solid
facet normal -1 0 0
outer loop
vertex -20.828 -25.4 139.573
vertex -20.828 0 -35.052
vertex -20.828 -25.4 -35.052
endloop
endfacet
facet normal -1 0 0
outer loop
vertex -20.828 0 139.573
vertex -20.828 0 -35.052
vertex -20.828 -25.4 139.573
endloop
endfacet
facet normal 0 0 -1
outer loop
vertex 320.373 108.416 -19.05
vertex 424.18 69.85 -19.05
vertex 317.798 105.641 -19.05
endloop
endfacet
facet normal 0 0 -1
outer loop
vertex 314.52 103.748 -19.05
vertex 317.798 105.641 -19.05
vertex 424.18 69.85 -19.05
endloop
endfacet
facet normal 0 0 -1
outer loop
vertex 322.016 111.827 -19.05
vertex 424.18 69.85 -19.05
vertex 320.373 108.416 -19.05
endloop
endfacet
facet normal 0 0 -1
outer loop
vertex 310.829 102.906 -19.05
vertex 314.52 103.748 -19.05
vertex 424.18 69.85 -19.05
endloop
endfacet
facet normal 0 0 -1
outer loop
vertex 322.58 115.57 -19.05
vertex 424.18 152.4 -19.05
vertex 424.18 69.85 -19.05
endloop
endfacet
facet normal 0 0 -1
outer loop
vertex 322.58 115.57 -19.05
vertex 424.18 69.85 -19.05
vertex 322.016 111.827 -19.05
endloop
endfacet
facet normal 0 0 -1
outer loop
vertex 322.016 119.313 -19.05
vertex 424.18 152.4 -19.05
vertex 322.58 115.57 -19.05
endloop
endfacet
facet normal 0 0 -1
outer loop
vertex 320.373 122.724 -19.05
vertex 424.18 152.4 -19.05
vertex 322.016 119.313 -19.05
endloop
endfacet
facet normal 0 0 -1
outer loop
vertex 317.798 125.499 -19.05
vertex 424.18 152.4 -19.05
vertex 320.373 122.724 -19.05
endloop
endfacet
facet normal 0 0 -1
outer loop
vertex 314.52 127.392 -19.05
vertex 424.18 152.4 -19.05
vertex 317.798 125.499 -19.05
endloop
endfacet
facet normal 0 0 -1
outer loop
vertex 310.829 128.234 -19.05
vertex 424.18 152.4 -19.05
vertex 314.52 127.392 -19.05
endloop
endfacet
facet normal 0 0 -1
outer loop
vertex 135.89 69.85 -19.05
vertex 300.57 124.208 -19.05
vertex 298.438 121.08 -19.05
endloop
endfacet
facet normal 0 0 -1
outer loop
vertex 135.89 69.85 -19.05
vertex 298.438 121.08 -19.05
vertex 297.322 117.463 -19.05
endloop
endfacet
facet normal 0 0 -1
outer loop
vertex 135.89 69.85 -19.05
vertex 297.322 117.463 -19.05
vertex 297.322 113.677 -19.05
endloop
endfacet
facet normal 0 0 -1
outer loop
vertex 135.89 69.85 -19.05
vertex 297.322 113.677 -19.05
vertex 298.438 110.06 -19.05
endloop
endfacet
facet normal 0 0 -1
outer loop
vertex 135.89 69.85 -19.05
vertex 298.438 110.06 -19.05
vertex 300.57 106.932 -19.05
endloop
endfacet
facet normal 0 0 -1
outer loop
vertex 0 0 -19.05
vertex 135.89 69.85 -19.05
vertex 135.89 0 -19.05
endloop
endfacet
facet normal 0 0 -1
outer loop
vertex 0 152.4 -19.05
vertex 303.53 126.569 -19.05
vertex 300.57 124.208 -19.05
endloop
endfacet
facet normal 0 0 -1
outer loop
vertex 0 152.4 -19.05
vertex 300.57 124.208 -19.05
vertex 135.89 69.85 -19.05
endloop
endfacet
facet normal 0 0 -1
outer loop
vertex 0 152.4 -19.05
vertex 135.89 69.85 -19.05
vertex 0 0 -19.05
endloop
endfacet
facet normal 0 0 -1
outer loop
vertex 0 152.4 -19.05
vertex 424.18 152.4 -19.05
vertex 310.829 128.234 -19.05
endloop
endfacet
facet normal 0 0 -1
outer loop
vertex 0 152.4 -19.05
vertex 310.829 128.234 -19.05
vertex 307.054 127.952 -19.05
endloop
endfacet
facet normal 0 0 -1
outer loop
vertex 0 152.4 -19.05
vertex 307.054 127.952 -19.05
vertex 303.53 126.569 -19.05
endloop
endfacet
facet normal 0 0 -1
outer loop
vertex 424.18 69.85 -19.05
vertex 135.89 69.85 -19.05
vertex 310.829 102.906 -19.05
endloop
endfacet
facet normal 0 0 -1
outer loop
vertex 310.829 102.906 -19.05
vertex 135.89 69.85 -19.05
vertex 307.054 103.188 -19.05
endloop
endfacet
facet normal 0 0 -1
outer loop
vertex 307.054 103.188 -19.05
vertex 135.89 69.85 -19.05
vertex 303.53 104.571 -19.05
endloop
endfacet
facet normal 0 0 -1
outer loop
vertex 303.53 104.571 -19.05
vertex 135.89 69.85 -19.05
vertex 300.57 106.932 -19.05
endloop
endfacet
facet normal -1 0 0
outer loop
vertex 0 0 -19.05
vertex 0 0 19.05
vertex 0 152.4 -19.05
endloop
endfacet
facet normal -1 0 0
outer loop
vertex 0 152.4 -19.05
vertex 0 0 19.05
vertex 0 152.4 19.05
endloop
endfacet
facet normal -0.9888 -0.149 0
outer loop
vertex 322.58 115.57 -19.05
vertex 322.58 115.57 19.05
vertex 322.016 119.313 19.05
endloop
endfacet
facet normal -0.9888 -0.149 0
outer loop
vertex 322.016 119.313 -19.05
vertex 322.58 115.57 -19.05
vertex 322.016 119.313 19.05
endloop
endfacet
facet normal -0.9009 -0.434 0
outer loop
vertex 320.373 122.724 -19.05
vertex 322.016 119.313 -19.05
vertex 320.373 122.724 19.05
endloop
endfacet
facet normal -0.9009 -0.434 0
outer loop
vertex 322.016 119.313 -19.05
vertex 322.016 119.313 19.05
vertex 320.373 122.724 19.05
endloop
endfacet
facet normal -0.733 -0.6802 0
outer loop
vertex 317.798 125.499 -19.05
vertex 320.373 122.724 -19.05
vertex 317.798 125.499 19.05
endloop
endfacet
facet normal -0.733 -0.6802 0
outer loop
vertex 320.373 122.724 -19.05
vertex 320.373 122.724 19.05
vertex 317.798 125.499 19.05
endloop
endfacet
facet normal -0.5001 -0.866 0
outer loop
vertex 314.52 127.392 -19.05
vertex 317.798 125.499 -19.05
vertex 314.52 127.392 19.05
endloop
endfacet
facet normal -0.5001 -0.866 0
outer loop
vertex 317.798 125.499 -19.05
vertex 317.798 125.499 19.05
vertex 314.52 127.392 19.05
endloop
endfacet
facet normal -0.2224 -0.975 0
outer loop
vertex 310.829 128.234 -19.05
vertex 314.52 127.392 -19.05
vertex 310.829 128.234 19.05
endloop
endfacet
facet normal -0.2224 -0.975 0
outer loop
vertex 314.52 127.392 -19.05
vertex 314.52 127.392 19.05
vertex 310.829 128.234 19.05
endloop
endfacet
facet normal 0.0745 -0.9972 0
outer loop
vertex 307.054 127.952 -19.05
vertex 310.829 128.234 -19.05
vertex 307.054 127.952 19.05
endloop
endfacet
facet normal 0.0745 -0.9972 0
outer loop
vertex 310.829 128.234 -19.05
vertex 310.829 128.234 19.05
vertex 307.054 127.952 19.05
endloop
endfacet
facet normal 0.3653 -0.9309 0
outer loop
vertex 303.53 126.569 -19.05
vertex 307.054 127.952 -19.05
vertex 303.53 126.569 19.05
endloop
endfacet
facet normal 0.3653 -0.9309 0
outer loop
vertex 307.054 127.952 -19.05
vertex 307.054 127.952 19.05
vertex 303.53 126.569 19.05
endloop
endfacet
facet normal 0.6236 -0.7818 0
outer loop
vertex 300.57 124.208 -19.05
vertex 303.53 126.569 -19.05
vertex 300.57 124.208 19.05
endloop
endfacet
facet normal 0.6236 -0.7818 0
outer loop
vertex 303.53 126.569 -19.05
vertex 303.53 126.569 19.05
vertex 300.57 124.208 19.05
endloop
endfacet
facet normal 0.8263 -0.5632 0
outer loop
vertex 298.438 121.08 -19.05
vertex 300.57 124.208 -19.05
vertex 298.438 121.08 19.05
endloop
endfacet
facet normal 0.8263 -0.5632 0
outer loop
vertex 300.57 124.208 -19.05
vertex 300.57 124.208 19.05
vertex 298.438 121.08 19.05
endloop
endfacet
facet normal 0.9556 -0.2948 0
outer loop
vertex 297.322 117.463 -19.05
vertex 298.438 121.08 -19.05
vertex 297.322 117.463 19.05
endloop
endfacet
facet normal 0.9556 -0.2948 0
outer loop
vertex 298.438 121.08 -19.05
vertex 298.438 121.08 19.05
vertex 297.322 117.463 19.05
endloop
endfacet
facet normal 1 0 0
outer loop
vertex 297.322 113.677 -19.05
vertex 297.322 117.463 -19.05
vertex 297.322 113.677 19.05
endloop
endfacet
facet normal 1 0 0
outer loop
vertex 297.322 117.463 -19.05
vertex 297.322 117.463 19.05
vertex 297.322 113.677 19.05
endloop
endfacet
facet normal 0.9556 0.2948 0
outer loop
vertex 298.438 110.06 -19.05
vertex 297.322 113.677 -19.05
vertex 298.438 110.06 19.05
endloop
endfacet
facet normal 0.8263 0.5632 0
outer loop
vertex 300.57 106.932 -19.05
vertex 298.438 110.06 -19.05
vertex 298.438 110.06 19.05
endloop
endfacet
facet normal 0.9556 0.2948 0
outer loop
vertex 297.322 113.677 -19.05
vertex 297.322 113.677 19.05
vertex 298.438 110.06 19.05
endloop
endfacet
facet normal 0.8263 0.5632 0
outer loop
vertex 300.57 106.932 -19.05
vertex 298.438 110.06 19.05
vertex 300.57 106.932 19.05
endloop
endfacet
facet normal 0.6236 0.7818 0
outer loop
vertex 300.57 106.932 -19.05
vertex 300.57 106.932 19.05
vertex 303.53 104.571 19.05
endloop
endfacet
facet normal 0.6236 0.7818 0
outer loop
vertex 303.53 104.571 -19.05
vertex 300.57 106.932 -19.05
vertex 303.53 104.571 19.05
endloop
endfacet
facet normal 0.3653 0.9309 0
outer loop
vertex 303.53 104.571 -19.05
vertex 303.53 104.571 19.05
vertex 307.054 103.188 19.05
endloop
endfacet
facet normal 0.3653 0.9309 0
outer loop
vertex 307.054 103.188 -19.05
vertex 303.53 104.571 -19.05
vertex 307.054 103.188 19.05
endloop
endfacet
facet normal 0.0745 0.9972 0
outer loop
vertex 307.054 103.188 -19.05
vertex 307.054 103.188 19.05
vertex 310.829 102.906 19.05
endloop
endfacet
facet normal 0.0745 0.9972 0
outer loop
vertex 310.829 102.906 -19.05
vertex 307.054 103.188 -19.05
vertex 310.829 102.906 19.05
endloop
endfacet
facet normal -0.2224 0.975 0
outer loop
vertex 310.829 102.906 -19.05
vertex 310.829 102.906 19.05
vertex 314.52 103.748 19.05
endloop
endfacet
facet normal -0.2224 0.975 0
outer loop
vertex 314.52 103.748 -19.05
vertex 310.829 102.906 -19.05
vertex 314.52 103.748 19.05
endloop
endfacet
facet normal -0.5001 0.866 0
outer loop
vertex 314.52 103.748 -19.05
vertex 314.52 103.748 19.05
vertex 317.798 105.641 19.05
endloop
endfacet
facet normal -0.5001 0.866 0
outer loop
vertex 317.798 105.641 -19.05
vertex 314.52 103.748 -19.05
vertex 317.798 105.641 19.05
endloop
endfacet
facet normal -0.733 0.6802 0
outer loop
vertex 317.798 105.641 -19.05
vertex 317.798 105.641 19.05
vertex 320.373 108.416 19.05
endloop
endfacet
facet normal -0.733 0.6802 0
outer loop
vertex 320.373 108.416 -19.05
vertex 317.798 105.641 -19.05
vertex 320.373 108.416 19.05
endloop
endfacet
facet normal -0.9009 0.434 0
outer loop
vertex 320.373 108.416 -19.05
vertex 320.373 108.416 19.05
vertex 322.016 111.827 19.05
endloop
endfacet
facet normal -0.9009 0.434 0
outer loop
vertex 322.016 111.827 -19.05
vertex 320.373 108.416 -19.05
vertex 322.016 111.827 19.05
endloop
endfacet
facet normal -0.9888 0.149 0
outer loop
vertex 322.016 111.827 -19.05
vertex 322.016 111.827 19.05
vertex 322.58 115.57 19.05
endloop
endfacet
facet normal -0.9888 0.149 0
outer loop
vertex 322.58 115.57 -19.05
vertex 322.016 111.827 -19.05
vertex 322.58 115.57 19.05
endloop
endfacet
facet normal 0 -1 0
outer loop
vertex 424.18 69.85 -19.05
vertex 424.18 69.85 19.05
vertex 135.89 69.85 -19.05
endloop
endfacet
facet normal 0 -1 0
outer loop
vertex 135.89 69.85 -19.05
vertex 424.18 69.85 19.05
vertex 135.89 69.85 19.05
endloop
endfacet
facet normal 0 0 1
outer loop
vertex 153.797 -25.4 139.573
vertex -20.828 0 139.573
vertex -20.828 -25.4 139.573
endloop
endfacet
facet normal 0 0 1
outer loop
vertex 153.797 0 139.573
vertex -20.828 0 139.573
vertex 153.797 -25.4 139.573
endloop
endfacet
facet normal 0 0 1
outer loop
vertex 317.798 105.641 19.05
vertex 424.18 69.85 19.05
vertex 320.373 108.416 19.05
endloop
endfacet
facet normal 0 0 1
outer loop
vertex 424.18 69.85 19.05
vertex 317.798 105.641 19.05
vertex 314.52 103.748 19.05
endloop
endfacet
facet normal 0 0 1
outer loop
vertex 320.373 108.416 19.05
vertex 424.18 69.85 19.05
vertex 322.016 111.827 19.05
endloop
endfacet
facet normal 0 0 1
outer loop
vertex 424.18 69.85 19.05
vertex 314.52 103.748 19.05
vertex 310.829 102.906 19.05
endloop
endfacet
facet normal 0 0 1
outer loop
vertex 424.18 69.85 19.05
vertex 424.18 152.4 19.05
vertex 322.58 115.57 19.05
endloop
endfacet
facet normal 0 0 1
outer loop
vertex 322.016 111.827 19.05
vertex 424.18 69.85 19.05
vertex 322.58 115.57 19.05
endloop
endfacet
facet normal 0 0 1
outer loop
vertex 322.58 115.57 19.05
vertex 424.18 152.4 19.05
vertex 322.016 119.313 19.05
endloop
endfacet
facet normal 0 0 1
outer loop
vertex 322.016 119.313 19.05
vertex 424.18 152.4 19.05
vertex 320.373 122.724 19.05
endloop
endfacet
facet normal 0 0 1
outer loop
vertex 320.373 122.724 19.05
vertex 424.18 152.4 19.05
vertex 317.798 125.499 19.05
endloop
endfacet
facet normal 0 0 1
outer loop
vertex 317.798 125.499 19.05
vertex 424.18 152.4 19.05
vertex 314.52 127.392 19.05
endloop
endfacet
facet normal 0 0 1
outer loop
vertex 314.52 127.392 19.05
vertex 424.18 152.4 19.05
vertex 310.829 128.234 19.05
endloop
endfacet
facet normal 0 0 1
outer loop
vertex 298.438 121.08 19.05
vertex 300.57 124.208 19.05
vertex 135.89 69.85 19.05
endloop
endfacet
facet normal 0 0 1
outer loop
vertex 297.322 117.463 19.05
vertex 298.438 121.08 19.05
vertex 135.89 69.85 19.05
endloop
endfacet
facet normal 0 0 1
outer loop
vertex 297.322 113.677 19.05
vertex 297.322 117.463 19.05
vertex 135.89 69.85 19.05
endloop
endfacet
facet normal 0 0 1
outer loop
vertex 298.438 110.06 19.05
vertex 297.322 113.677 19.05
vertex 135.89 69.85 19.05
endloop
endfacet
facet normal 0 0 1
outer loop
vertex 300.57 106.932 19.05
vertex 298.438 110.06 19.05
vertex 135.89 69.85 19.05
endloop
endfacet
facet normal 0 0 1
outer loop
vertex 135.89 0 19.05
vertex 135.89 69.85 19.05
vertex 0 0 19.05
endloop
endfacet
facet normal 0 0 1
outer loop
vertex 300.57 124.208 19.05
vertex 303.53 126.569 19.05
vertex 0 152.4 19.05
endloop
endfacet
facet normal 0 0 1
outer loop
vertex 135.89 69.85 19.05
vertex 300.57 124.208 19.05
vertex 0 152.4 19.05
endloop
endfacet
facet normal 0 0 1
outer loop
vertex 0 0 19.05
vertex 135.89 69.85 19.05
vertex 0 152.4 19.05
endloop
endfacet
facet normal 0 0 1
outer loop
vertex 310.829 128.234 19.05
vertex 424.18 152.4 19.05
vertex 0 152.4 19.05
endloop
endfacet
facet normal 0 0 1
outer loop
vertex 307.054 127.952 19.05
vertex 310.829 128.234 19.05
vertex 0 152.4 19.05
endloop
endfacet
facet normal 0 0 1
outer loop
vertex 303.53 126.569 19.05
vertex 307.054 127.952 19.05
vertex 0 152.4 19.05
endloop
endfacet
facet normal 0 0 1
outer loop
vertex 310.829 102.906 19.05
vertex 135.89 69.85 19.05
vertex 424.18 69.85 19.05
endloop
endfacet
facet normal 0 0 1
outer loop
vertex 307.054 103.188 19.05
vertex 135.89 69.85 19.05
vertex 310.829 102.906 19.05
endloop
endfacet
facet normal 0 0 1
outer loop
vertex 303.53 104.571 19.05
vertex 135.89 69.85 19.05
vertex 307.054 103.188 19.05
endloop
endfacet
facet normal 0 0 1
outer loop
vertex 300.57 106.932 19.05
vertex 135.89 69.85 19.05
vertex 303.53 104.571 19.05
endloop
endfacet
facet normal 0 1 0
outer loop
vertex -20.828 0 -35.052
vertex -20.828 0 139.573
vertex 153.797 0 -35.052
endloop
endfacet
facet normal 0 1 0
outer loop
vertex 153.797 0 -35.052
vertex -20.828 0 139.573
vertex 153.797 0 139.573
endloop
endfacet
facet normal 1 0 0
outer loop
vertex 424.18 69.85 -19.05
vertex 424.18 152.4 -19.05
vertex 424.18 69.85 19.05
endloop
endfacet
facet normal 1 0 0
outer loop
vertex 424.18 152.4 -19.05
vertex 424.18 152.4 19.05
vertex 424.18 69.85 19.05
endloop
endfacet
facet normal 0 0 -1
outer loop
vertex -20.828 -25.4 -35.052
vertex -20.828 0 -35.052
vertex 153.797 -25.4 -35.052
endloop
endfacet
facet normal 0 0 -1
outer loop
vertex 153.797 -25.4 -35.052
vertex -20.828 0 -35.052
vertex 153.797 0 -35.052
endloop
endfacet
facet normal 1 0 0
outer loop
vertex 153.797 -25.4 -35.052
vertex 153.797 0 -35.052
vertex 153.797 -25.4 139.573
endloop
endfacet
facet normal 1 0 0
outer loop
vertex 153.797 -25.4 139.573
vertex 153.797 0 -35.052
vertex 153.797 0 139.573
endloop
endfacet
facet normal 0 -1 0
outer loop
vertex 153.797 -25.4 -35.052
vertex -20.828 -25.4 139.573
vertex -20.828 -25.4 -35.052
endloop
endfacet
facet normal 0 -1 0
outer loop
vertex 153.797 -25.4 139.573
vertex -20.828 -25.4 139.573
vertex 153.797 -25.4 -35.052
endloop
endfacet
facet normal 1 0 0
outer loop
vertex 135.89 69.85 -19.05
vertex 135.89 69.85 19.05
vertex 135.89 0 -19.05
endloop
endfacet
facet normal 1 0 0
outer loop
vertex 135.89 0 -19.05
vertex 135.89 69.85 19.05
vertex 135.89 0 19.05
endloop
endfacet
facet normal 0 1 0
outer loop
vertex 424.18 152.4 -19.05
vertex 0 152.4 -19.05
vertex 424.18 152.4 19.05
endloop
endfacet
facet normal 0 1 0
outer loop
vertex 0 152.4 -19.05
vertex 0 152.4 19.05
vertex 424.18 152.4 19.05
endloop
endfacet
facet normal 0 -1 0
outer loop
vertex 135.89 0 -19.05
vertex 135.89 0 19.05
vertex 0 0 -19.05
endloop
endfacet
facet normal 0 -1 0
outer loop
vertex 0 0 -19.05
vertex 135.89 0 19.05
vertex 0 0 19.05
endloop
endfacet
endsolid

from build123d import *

# Parameters (mm, degrees)
BOSS_EXTRUDE1_DEPTH = 19.05
SKETCH2_R           = 12.7
CUT_EXTRUDE1_DEPTH  = 453.333994301
SKETCH4_W           = 174.625
SKETCH4_H           = 174.625
BOSS_EXTRUDE2_DEPTH = 25.4


with BuildPart() as part:
    # Sketch1 → Boss-Extrude1 (new, symmetric)
    with BuildSketch(Plane.XY):
        Polygon((0, 0), (0, 152.4), (424.18, 152.4), (424.18, 69.85), (135.89, 69.85), (135.89, 0), align=None)
    extrude(amount=BOSS_EXTRUDE1_DEPTH, both=True)

    # Sketch2 → Cut-Extrude1 (cut, through all)
    with BuildSketch(Plane.XY.offset(19.05)):
        with Locations((309.88, 115.57)):
            Circle(SKETCH2_R)
    extrude(amount=-CUT_EXTRUDE1_DEPTH, mode=Mode.SUBTRACT)


with BuildPart() as body_2:
    # Sketch4 → Boss-Extrude2 (new body)
    with BuildSketch(Plane.XZ):
        with Locations((66.4845, 52.2605)):
            Rectangle(SKETCH4_W, SKETCH4_H)
    extrude(amount=BOSS_EXTRUDE2_DEPTH)


solid = Compound([part.part, body_2.part])
